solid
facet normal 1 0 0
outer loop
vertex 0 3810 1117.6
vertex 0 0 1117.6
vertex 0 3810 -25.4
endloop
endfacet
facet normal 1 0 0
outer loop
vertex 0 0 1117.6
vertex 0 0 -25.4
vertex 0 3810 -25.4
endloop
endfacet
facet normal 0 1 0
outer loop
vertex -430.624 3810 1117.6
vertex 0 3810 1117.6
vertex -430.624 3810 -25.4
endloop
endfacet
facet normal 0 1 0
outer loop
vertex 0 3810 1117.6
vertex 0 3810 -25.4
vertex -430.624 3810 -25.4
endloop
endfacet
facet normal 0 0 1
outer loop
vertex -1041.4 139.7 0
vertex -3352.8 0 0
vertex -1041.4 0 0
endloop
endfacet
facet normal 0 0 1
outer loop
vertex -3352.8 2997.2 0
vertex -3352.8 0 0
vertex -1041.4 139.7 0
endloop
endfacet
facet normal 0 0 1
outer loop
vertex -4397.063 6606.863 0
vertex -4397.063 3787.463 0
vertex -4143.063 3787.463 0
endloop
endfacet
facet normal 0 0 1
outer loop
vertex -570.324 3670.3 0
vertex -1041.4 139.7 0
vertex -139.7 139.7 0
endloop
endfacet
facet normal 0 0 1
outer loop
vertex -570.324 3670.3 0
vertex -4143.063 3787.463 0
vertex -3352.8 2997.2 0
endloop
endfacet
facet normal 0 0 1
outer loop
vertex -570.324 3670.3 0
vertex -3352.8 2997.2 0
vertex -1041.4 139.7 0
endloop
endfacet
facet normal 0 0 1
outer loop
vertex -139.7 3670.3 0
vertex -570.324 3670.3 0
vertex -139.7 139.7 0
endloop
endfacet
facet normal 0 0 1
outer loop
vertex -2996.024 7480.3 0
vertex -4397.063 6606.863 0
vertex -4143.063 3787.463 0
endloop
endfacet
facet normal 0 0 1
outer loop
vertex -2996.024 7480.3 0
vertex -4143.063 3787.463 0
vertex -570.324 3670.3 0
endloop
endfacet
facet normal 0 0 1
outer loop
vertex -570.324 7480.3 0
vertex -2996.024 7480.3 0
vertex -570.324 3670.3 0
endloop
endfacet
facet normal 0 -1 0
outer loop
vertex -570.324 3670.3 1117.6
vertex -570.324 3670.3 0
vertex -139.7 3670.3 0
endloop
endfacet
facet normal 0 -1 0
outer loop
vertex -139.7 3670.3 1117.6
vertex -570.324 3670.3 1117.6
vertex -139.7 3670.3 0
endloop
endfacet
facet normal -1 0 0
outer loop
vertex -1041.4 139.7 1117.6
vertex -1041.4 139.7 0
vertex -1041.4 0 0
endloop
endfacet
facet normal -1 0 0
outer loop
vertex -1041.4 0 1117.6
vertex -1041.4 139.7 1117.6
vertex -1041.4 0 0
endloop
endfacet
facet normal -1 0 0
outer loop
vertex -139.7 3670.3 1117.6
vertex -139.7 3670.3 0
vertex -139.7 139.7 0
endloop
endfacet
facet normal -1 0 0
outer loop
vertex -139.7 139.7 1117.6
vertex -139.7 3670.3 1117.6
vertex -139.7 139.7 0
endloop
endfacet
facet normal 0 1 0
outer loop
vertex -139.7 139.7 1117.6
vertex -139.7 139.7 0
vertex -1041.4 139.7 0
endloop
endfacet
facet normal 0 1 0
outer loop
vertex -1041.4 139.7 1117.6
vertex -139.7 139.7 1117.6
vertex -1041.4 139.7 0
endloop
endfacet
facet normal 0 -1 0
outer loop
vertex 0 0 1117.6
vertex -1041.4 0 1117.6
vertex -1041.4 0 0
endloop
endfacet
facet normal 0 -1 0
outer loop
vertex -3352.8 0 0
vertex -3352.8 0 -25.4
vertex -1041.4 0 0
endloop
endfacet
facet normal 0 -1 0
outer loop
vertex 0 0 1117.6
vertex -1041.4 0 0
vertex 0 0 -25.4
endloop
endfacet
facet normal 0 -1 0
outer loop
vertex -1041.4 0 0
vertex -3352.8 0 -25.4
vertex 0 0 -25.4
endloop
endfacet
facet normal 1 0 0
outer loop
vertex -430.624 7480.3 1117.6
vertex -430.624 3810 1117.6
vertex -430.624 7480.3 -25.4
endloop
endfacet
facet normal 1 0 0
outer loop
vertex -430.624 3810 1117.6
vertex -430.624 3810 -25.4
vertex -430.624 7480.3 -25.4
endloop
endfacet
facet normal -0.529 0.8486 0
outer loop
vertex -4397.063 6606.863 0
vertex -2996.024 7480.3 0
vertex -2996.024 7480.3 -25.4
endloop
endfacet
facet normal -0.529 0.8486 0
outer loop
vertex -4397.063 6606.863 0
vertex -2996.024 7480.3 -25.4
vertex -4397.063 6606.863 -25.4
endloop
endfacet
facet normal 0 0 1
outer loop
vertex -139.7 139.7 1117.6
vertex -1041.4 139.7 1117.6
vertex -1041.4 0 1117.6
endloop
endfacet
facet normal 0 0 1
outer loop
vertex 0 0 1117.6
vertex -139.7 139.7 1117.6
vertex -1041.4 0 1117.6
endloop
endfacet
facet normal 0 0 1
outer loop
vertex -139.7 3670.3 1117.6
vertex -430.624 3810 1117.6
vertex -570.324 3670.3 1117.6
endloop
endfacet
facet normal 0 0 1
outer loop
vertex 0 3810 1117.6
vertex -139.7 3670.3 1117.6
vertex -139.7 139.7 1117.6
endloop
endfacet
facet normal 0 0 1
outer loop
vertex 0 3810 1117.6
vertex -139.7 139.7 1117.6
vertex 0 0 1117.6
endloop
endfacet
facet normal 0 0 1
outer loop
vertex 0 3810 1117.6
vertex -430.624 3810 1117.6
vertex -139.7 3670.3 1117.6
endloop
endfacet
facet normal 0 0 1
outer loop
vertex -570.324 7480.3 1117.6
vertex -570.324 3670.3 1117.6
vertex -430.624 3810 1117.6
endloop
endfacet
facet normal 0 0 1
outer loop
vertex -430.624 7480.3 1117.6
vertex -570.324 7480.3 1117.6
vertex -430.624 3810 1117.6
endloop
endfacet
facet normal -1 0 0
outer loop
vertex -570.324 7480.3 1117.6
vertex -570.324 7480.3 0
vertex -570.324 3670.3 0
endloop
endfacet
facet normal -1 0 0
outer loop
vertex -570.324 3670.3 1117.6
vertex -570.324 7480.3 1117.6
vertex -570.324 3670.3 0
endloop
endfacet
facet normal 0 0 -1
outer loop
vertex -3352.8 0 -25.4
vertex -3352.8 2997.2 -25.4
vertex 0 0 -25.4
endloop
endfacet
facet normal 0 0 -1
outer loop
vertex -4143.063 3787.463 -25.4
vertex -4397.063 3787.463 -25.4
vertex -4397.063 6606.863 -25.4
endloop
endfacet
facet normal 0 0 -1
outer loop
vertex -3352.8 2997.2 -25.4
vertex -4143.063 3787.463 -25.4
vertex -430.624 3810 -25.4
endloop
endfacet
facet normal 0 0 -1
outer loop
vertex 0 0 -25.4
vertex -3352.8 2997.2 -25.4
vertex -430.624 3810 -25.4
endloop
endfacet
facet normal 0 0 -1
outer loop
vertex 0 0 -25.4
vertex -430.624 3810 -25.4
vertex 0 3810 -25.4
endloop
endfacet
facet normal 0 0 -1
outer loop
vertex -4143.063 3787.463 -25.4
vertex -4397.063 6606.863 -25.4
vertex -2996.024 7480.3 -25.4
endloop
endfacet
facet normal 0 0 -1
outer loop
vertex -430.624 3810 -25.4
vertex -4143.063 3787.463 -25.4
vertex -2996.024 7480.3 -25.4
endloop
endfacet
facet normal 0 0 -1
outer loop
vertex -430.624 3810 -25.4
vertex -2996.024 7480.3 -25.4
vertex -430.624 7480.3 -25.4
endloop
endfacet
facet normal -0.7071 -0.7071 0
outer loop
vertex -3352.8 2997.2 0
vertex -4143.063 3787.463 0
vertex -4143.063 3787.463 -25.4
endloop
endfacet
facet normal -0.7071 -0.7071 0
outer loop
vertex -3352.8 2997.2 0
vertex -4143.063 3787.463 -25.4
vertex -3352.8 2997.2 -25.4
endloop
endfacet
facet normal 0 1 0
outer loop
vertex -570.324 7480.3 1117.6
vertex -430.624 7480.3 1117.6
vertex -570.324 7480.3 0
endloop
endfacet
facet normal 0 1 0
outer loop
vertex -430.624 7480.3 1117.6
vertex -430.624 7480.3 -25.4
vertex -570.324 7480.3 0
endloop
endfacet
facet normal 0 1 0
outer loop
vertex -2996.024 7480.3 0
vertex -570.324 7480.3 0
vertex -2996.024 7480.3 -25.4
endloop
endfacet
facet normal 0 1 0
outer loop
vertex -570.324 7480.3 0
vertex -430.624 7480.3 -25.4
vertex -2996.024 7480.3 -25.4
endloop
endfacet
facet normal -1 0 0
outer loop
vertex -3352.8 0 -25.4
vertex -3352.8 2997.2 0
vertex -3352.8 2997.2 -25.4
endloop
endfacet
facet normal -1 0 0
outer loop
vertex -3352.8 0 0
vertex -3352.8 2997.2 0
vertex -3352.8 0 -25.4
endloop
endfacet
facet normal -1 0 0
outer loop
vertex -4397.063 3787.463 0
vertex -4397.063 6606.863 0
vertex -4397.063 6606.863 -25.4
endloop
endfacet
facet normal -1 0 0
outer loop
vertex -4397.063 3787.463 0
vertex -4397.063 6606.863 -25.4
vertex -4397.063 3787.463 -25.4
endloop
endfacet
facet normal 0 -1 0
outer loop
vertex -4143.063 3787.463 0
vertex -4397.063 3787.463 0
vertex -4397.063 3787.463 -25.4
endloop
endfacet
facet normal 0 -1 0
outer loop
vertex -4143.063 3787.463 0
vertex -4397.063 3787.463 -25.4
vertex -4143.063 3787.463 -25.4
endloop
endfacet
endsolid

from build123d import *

# Parameters (mm, degrees)
F1_DEPTH = 25.4
F2_DEPTH = 1117.6


# Not quite as in the source:
# - the program builds the solid bodies; features that only make, move or delete a surface that nothing else refers to are left out


with BuildPart() as f1:
    # F0 (on Top) → F1 (new body)
    with BuildSketch(Plane.XY):
        Polygon((-1041.4, 0), (0, 0), (0, 3810), (-430.6243517664, 3810), (-430.6243517664, 7480.3), (-570.3243517664, 7480.3), (-570.3243517664, 3810), (-570.3243517664, 3670.3), (-139.7, 3670.3), (-139.7, 139.7), (-1041.4, 139.7), align=None)
        Polygon((-3352.8, 0), (-1041.4, 0), (-1041.4, 139.7), (-139.7, 139.7), (-139.7, 3670.3), (-570.3243517664, 3670.3), (-570.3243517664, 3810), (-570.3243517664, 7480.3), (-2996.0243517664, 7480.3), (-4397.0625386541, 6606.8625386541), (-4397.0625386541, 3787.4625386541), (-4143.0625386541, 3787.4625386541), (-3352.8, 2997.2), align=None)
    extrude(amount=-F1_DEPTH)

    # F0 (on Top) → F2 (join)
    with BuildSketch(Plane.XY):
        Polygon((-1041.4, 0), (0, 0), (0, 3810), (-430.6243517664, 3810), (-430.6243517664, 7480.3), (-570.3243517664, 7480.3), (-570.3243517664, 3810), (-570.3243517664, 3670.3), (-139.7, 3670.3), (-139.7, 139.7), (-1041.4, 139.7), align=None)
    extrude(amount=F2_DEPTH)


solid = f1.part
